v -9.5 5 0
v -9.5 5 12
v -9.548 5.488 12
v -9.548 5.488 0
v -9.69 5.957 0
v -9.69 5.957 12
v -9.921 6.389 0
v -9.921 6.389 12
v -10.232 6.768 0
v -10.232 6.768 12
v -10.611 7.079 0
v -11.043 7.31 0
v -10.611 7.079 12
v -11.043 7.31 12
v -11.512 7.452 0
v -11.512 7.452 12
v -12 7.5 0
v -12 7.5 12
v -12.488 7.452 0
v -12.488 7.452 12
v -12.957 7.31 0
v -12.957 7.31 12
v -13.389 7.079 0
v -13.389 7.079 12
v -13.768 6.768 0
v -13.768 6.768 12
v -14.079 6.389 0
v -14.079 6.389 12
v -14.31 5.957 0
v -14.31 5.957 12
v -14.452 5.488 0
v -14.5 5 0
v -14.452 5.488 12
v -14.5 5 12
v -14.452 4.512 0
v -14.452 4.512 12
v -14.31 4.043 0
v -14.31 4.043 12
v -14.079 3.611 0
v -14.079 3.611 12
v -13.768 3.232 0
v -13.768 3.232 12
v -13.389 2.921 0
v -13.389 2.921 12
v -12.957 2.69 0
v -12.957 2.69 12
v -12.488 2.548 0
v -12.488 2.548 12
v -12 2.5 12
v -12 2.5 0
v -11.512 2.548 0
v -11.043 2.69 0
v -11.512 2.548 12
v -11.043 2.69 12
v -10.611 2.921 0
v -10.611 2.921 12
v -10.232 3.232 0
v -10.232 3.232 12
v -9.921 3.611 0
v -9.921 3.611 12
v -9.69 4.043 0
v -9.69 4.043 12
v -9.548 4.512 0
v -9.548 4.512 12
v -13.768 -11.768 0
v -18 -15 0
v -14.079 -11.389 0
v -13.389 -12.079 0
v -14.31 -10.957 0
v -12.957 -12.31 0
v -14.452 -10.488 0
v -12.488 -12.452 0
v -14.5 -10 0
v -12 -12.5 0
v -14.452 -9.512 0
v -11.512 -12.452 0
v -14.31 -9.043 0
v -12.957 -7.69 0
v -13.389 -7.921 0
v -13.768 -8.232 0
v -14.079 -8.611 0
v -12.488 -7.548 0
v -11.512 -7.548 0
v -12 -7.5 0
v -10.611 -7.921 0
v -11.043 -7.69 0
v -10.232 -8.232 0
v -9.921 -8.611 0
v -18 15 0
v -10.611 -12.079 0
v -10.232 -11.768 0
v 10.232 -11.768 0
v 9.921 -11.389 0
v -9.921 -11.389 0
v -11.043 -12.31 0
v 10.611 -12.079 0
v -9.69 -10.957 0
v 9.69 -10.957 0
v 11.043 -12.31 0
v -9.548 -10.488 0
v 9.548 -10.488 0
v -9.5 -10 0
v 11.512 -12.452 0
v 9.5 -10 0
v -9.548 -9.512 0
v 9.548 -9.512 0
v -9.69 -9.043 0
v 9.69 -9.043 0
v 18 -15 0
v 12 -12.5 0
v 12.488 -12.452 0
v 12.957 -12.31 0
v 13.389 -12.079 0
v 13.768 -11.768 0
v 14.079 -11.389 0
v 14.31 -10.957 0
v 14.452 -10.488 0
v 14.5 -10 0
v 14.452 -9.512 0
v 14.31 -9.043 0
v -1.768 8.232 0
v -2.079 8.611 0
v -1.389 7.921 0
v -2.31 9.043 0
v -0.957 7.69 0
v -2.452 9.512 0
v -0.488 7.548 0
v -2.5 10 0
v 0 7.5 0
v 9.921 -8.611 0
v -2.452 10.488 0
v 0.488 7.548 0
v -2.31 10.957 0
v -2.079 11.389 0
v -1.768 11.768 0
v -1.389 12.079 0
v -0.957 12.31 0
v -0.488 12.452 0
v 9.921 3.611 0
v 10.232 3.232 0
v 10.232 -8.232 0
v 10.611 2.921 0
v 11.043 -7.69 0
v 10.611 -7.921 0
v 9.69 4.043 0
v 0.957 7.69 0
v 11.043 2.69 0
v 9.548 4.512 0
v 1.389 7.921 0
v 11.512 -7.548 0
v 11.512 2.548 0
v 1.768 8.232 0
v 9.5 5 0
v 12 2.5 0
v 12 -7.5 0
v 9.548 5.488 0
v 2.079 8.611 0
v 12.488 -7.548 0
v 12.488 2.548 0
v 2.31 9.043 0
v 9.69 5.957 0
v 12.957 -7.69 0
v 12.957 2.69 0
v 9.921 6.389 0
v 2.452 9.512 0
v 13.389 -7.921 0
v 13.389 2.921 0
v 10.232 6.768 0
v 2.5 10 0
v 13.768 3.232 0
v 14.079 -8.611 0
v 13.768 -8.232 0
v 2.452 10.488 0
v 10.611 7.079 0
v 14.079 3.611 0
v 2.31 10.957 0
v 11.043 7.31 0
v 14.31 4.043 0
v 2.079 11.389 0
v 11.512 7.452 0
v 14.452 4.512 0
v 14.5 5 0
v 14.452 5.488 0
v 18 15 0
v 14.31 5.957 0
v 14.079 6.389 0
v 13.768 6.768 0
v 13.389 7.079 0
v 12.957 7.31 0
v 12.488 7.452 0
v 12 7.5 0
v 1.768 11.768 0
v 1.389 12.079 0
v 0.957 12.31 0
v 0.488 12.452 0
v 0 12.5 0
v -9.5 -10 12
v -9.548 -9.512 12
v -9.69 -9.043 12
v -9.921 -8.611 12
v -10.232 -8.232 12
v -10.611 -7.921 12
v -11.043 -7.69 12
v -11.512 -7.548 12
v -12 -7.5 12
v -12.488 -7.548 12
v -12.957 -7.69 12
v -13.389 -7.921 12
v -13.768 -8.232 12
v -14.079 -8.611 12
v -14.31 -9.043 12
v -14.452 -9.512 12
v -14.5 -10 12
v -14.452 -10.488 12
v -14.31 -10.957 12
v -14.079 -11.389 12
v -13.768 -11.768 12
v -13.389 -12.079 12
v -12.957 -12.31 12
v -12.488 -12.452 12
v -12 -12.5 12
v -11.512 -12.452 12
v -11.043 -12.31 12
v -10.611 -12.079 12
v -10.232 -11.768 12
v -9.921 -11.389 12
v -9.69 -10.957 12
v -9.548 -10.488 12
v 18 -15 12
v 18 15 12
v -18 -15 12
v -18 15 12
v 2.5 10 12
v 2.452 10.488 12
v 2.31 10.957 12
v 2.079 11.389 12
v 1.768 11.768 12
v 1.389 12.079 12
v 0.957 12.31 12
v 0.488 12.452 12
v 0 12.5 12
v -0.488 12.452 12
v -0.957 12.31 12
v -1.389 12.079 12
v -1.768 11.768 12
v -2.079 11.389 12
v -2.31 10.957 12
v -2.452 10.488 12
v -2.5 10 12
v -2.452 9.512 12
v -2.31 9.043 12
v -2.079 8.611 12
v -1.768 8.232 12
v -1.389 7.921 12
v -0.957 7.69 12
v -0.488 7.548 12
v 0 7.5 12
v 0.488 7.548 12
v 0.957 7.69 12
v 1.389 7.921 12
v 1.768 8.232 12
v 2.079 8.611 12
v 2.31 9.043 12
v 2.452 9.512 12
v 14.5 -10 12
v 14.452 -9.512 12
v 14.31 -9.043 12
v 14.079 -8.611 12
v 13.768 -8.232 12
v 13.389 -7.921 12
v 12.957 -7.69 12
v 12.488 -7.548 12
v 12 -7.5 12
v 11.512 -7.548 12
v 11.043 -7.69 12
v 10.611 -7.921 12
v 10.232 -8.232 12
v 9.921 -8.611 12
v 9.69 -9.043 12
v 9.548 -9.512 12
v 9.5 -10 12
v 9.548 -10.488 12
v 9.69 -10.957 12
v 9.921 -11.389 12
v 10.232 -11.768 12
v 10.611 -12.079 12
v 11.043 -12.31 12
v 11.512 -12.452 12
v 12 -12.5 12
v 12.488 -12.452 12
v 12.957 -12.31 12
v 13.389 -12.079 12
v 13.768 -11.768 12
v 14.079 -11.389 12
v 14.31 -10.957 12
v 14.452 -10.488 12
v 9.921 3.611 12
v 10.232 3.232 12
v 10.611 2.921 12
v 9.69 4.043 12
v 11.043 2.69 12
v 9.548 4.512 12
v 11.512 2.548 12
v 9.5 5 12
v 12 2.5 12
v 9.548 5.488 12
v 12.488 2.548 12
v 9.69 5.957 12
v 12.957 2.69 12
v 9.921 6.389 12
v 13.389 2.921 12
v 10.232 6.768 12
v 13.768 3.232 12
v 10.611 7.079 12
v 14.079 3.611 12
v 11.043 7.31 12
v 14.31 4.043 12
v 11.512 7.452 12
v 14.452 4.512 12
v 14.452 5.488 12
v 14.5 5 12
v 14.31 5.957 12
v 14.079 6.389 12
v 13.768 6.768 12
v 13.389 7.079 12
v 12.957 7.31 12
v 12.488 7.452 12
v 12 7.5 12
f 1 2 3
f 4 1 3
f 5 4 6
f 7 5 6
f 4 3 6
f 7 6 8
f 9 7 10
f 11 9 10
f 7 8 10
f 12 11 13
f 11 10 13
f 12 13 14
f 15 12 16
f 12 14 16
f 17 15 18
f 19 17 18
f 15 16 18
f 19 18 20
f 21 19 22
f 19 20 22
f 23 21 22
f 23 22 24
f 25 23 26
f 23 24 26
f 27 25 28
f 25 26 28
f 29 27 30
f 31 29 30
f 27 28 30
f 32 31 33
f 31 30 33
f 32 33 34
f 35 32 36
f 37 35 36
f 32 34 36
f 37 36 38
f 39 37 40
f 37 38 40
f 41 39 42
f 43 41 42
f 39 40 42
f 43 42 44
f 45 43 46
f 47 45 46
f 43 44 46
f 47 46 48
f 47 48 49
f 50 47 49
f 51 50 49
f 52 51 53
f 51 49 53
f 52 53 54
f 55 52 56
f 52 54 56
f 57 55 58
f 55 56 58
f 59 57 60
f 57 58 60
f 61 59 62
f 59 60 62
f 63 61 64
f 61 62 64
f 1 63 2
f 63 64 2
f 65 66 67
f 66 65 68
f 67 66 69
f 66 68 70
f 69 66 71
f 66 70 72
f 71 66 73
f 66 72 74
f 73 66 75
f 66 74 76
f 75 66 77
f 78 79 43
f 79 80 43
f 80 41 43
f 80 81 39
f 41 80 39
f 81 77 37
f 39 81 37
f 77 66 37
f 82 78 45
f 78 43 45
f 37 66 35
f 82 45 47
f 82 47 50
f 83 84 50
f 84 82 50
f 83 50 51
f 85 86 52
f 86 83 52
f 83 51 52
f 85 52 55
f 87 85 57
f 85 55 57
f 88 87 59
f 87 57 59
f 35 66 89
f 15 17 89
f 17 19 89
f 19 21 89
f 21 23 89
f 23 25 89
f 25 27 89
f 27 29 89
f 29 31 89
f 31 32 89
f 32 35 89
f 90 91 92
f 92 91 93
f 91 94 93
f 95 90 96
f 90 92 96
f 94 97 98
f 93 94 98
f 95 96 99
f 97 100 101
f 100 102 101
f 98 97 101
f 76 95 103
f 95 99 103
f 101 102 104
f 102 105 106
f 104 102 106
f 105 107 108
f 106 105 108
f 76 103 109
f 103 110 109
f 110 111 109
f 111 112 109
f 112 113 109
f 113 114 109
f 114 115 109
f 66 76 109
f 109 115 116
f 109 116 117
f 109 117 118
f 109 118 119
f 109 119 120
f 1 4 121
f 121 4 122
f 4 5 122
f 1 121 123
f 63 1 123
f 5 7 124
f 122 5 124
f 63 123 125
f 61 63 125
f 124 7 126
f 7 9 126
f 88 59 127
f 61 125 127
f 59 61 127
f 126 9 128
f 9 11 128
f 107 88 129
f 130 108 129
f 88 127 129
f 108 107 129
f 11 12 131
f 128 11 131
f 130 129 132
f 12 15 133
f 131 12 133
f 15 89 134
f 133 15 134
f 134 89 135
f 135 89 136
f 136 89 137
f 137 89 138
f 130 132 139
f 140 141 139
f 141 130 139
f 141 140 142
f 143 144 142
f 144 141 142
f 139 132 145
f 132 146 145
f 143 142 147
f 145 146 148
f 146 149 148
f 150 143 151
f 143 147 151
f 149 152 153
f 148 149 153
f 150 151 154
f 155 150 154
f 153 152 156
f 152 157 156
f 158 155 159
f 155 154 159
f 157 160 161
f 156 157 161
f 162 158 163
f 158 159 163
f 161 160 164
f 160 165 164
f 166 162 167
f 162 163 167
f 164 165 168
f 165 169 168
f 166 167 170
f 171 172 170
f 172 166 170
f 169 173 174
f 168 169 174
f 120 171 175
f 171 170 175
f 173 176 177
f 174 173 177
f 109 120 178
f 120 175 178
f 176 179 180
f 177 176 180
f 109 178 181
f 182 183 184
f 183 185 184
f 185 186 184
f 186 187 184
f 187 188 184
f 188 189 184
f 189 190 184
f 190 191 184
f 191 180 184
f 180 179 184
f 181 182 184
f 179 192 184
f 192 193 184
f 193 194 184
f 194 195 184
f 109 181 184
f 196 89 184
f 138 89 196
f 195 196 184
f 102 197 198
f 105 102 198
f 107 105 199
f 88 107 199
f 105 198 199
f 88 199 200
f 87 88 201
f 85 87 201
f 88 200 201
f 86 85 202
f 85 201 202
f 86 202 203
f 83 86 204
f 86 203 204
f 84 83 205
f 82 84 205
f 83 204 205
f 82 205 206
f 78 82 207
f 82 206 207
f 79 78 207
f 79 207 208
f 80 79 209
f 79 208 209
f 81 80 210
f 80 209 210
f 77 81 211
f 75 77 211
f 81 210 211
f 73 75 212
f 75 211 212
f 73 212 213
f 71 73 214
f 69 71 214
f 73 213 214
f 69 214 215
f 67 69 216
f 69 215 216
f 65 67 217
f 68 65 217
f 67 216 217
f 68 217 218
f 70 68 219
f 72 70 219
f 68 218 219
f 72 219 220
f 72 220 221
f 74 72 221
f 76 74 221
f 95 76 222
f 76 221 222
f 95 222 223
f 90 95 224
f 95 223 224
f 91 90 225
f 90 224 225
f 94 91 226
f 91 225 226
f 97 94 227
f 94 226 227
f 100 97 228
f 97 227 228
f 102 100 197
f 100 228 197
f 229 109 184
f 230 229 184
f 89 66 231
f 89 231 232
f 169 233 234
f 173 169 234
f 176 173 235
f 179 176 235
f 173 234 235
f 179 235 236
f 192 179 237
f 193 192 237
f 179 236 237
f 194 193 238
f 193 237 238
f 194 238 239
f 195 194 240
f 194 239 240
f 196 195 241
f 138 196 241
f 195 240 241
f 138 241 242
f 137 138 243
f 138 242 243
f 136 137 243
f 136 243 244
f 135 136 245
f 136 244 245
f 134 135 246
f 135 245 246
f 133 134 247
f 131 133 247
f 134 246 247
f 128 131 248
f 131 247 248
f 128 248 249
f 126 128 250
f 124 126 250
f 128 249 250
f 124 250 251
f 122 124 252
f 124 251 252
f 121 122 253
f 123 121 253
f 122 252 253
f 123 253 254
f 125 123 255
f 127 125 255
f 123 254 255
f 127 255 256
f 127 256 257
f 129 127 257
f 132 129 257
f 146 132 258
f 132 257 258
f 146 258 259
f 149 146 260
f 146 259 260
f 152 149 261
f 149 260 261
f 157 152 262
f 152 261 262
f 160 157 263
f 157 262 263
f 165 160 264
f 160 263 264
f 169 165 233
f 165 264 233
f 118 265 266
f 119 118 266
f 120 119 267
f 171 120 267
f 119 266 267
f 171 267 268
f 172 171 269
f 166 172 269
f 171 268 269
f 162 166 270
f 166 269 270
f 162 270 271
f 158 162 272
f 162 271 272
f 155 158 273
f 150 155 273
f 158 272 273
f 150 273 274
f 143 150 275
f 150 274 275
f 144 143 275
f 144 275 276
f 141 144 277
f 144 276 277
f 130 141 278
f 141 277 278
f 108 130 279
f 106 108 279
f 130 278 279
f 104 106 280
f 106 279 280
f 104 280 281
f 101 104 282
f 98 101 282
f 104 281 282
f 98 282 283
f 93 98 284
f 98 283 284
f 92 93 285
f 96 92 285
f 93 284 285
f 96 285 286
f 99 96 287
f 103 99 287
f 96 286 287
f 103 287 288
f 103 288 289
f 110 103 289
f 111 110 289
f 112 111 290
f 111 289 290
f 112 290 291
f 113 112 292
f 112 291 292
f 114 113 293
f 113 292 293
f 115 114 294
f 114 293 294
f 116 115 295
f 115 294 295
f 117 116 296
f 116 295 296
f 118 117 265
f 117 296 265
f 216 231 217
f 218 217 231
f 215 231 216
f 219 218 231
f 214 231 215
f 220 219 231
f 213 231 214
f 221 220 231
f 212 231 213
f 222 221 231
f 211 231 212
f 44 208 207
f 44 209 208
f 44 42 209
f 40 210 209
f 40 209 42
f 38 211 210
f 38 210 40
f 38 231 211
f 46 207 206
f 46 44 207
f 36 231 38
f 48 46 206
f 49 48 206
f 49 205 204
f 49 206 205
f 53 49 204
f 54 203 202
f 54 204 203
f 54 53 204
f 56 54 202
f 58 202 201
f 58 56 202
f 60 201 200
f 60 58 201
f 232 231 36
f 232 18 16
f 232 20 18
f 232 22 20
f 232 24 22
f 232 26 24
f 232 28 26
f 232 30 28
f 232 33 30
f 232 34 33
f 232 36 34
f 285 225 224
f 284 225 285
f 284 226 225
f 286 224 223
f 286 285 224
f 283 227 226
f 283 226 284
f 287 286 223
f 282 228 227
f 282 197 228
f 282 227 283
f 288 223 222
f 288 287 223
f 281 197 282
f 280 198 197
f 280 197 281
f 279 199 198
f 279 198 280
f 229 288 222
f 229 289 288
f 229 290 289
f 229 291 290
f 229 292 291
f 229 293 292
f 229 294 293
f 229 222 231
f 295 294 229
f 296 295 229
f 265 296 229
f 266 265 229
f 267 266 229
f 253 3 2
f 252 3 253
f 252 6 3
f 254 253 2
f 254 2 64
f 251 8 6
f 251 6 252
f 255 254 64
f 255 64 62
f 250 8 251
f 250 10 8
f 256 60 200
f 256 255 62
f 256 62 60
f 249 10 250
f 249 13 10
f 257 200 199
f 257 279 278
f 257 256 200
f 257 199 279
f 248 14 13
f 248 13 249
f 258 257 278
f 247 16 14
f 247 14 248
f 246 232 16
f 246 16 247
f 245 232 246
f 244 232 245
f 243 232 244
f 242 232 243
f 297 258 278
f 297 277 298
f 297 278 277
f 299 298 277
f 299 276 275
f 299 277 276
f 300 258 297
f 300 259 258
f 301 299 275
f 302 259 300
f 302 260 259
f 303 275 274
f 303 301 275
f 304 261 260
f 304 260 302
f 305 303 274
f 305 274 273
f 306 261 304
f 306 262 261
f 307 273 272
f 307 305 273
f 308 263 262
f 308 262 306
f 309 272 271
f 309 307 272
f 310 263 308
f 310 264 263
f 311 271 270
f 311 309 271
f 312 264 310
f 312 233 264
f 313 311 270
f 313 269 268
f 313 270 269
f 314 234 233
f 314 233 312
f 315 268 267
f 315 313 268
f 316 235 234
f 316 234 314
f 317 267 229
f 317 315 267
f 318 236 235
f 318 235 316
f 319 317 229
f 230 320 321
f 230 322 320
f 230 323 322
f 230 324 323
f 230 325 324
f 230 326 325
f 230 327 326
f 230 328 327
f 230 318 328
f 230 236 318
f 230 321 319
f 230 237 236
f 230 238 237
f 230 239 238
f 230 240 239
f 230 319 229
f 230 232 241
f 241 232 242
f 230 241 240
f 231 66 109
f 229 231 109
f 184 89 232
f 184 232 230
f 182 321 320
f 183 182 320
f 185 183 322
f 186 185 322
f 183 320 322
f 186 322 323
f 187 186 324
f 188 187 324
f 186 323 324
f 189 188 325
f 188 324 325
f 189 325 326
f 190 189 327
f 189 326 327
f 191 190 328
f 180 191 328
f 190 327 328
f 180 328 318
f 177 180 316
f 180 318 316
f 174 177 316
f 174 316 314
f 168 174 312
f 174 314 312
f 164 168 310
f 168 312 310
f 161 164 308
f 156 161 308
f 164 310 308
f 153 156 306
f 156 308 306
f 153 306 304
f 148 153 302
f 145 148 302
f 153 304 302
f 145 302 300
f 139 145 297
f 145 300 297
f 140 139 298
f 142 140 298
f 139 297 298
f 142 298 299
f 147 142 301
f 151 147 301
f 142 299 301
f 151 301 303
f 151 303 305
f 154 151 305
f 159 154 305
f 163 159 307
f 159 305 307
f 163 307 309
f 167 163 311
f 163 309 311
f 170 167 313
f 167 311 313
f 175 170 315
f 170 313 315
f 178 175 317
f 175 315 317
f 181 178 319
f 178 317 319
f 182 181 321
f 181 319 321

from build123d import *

# Parameters (mm, degrees)
SKETCH_1_W          = 36
SKETCH_1_H          = 30
EXTRUDE_1_DEPTH     = 12
SKETCH_2_R          = 2.5
CUT_EXTRUDE_2_DEPTH = 12
SKETCH_3_R          = 2.5
CUT_EXTRUDE_3_DEPTH = 12


with BuildPart() as part:
    # 草图1 → 凸台-拉伸1 (new body)
    with BuildSketch(Plane.XY):
        Rectangle(SKETCH_1_W, SKETCH_1_H)
    extrude(amount=EXTRUDE_1_DEPTH)

    # 草图2 → 切除-拉伸2 (cut)
    with BuildSketch(Plane.XY.offset(12)):
        with Locations((-12, 5)):
            Circle(SKETCH_2_R)
        with Locations((12, 5)):
            Circle(SKETCH_2_R)
        with Locations((12, -10)):
            Circle(SKETCH_2_R)
        with Locations((-12, -10)):
            Circle(SKETCH_2_R)
    extrude(amount=-CUT_EXTRUDE_2_DEPTH, mode=Mode.SUBTRACT)

    # 草图3 → 切除-拉伸3 (cut)
    with BuildSketch(Plane.XY.offset(12)):
        with Locations((0, 10)):
            Circle(SKETCH_3_R)
    extrude(amount=-CUT_EXTRUDE_3_DEPTH, mode=Mode.SUBTRACT)


solid = part.part
